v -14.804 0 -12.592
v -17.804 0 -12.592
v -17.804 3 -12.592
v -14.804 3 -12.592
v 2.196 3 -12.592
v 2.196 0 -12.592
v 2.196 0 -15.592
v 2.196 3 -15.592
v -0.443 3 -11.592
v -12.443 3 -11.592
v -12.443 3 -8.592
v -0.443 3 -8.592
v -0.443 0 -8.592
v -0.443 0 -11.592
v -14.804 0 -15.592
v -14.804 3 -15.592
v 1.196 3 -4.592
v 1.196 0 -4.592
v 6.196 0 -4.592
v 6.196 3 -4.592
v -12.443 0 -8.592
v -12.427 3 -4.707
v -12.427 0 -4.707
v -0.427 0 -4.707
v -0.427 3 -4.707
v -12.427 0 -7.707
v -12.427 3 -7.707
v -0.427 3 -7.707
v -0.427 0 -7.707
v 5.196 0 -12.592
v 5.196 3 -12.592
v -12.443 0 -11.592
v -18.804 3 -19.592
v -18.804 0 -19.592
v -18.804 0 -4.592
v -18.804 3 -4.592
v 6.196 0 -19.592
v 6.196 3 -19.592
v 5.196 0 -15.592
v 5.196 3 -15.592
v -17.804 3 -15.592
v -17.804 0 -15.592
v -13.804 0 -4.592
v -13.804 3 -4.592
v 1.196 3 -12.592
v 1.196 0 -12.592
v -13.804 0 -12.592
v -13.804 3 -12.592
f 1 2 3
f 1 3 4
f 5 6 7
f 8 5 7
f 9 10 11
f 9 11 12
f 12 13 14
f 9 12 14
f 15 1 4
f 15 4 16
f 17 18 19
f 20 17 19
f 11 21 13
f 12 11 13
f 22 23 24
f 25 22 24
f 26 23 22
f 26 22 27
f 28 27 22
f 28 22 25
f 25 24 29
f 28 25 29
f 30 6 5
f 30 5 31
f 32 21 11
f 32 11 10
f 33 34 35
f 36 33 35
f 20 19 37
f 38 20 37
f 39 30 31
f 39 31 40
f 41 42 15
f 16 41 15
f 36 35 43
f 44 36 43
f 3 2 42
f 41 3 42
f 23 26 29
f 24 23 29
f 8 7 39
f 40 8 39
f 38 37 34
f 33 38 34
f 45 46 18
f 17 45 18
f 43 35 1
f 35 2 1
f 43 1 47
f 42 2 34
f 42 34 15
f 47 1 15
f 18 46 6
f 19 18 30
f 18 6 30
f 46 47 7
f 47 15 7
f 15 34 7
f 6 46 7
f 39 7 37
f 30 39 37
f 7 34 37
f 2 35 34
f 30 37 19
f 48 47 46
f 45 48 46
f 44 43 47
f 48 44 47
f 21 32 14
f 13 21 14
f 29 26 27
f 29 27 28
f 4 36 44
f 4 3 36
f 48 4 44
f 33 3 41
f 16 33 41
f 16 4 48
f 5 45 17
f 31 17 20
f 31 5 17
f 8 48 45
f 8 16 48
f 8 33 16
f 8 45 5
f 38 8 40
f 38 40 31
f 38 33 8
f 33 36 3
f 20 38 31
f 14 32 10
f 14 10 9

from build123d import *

# Parameters (mm, degrees)
SKETCH1_W             = 3
SKETCH1_H             = 3
BOSS_EXTRUDE1_DEPTH   = 3
SKETCH1_W_2           = 12
BOSS_EXTRUDE1_2_DEPTH = 3
BOSS_EXTRUDE1_3_DEPTH = 3


with BuildPart() as part:
    # Sketch1 → Boss-Extrude1 (new body)
    with BuildSketch(Plane(origin=(0, 0, 0), x_dir=(1, 0, 0), z_dir=(0, 1, 0))):
        Polygon((-18.803797147, 19.591775352), (-18.803797147, 4.591775352), (-13.803797147, 4.591775352), (-13.803797147, 12.591775352), (1.196202853, 12.591775352), (1.196202853, 4.591775352), (6.196202853, 4.591775352), (6.196202853, 19.591775352), align=None)
        with Locations((-16.303797147, 14.091775352)):
            Rectangle(SKETCH1_W, SKETCH1_H, mode=Mode.SUBTRACT)
        with Locations((3.696202853, 14.091775352)):
            Rectangle(SKETCH1_W, SKETCH1_H, mode=Mode.SUBTRACT)
    extrude(amount=BOSS_EXTRUDE1_DEPTH)


with BuildPart() as body_2:
    # Sketch1 → Boss-Extrude1 2 (new body)
    with BuildSketch(Plane(origin=(0, 0, 0), x_dir=(1, 0, 0), z_dir=(0, 1, 0))):
        with Locations((-6.427005905, 6.207154299)):
            Rectangle(SKETCH1_W_2, SKETCH1_H)
    extrude(amount=BOSS_EXTRUDE1_2_DEPTH)


with BuildPart() as body_3:
    # Sketch1 → Boss-Extrude1 3 (new body)
    with BuildSketch(Plane(origin=(0, 0, 0), x_dir=(1, 0, 0), z_dir=(0, 1, 0))):
        with Locations((-6.443434318, 10.091775352)):
            Rectangle(SKETCH1_W_2, SKETCH1_H)
    extrude(amount=BOSS_EXTRUDE1_3_DEPTH)


solid = Compound([part.part, body_2.part, body_3.part])
